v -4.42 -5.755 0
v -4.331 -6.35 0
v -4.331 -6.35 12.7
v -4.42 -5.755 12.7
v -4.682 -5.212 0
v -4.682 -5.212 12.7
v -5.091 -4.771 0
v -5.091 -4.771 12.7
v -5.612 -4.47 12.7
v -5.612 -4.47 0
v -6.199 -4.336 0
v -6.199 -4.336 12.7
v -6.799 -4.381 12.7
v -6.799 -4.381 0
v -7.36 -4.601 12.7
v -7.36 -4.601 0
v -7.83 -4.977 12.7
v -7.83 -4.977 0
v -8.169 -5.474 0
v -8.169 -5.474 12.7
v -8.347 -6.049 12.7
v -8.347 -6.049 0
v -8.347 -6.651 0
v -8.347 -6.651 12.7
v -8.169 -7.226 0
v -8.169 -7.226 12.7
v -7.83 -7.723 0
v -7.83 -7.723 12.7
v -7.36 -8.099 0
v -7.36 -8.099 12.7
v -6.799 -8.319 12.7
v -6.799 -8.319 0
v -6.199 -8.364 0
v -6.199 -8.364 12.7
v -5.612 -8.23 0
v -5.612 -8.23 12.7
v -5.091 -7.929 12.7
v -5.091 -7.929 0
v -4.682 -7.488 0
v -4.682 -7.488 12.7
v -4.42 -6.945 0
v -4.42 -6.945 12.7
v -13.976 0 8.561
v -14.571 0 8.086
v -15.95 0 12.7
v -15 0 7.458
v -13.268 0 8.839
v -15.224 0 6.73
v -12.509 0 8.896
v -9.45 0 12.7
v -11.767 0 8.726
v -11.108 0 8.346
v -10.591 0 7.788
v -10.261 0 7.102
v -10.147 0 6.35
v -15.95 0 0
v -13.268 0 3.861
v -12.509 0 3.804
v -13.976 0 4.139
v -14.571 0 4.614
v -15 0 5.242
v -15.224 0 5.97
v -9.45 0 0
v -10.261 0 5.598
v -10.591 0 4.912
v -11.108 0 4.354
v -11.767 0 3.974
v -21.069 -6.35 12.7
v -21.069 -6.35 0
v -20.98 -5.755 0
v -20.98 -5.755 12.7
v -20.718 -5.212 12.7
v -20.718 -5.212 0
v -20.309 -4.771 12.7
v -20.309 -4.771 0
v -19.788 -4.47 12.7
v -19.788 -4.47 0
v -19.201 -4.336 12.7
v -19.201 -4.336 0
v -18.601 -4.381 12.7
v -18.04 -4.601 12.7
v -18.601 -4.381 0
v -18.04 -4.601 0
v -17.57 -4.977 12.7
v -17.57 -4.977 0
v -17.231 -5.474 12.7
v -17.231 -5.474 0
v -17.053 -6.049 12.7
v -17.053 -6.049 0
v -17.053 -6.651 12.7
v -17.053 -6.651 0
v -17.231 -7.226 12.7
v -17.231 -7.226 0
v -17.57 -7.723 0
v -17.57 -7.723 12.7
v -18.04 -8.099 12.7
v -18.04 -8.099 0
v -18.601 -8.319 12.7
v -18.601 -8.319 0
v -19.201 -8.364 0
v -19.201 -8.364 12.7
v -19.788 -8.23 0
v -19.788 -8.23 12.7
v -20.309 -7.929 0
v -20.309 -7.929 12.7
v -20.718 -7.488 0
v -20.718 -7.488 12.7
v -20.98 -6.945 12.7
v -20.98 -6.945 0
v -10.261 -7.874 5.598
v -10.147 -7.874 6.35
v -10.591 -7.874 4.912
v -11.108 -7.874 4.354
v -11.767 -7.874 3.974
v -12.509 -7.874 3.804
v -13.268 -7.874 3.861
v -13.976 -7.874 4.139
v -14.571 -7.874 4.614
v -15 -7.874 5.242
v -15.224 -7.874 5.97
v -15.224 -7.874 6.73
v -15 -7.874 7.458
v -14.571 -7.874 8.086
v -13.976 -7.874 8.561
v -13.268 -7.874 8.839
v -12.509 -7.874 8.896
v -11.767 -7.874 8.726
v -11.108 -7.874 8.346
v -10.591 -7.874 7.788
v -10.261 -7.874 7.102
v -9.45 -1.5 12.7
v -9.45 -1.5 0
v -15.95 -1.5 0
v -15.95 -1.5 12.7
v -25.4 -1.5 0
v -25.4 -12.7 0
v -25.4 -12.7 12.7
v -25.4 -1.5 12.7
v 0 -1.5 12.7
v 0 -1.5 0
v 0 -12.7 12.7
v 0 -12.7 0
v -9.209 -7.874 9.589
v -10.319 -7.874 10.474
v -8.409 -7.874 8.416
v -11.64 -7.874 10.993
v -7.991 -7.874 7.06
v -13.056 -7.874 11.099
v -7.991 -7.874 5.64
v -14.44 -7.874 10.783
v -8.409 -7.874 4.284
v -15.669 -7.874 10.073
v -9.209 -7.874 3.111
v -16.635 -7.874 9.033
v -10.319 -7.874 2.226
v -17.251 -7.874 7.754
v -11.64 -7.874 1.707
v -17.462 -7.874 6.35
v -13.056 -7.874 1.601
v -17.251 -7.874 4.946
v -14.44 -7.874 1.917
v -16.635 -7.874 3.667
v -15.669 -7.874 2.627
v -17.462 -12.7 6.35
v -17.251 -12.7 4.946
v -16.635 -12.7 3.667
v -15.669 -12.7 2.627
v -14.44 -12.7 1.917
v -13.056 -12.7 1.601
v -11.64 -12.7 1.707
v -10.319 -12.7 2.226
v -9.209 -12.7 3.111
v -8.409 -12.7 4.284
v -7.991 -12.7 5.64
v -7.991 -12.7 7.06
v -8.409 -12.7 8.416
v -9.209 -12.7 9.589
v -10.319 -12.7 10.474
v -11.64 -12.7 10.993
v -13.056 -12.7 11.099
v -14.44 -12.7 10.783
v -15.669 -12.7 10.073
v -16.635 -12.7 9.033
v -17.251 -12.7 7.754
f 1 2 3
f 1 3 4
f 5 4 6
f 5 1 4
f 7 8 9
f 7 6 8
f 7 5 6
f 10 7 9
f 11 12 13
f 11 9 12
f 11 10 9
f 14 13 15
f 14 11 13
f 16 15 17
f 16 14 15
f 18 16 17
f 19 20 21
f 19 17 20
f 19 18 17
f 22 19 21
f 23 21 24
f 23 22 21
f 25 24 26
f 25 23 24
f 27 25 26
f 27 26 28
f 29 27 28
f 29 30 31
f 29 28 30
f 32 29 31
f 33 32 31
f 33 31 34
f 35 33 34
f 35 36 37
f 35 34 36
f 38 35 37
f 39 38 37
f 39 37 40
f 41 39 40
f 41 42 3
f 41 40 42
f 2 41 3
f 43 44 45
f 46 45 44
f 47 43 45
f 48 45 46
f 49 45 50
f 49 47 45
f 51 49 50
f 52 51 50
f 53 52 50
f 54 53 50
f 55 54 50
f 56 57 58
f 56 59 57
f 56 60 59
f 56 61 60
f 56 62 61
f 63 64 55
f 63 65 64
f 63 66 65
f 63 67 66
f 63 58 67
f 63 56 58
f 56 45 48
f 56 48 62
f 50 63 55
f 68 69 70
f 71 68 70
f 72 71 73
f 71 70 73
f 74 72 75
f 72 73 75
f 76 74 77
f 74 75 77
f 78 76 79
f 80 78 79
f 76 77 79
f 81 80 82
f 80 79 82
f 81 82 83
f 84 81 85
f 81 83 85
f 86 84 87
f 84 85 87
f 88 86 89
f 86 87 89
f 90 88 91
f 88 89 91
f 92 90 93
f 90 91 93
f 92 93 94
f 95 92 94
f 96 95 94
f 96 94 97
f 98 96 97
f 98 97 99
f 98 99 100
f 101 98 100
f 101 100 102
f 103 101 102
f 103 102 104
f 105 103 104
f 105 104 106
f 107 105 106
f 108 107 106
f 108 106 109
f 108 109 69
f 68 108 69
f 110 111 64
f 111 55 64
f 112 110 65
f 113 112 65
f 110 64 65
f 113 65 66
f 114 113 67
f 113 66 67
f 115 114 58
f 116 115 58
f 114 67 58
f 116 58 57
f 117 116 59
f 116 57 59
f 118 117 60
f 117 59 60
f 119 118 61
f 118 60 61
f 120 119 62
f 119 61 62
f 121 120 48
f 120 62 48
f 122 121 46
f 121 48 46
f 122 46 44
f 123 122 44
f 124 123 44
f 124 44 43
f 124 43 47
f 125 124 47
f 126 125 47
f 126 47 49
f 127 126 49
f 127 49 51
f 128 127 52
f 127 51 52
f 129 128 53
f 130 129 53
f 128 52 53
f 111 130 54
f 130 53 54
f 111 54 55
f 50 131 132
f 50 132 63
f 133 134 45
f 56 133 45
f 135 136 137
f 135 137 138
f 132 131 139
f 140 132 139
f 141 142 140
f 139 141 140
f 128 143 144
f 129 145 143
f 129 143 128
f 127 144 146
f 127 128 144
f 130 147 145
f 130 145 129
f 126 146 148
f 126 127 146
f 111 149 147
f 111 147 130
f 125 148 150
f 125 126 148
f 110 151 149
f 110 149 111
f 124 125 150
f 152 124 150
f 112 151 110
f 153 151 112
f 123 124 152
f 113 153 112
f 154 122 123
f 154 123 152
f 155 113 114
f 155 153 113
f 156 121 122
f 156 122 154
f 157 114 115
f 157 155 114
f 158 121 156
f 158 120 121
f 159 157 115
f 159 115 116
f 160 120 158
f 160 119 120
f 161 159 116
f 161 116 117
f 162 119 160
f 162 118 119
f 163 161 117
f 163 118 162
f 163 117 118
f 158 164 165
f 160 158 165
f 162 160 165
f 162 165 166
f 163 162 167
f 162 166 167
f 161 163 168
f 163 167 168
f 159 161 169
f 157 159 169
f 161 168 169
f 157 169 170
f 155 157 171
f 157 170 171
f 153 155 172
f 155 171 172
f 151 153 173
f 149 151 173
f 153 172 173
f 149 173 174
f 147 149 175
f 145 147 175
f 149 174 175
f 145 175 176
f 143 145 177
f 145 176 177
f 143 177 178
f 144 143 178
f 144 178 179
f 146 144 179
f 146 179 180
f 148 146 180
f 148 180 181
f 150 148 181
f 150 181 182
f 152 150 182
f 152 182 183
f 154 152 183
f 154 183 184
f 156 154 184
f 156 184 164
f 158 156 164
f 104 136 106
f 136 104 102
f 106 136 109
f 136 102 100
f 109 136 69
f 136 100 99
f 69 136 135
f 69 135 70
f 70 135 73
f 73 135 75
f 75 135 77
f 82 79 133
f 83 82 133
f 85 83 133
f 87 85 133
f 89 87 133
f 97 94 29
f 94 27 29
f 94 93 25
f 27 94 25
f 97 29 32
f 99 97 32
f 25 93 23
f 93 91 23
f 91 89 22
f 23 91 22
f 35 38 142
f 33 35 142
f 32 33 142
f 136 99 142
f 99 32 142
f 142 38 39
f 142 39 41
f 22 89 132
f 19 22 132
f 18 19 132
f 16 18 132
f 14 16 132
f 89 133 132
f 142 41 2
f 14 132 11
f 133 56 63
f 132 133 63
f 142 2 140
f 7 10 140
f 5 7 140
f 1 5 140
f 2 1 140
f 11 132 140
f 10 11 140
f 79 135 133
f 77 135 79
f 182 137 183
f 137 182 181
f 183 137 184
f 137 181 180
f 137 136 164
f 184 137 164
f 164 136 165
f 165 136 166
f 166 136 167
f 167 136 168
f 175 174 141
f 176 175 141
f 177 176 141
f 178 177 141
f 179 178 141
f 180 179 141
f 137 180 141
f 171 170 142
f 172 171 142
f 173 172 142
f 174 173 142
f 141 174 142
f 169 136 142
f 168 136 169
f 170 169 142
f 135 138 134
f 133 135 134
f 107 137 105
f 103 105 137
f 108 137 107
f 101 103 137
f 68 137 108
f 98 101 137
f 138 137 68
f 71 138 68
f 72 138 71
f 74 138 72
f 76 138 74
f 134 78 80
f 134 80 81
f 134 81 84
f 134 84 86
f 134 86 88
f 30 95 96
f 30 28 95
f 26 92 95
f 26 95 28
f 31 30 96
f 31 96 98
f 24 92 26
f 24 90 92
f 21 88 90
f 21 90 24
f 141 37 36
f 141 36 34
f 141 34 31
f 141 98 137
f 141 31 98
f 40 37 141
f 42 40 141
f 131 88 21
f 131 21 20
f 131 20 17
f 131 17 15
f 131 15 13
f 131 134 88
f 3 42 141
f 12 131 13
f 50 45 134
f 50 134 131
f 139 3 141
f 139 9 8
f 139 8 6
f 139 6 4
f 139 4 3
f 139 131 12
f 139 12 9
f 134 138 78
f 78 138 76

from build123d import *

# Parameters (mm, degrees)
SKETCH5_W                                       = 25.4
SKETCH5_H                                       = 12.7
BOSS_EXTRUDE2_DEPTH                             = 12.7
F_10_32_TAPPED_HOLE1_D                          = 4.0386
SKETCH6_W                                       = 9.45
SKETCH6_H                                       = 1.5
CUT_EXTRUDE1_DEPTH                              = 12.7
CBORE_FOR_10_SOCKET_HEAD_CAP_SCREW2_D           = 5.1054
CBORE_FOR_10_SOCKET_HEAD_CAP_SCREW2_CBORE_D     = 9.525
CBORE_FOR_10_SOCKET_HEAD_CAP_SCREW2_CBORE_DEPTH = 4.826


with BuildPart() as part:
    # Sketch5 → Boss-Extrude2 (new body)
    with BuildSketch(Plane.XY):
        with Locations((-12.7, -6.35)):
            Rectangle(SKETCH5_W, SKETCH5_H)
    extrude(amount=BOSS_EXTRUDE2_DEPTH)

    # #10-32 Tapped Hole1 (through all)
    with Locations(Plane.XY.offset(12.7)):
        with Locations((-19.05, -6.35)):
            f_10_32_tapped_hole1 = Hole(F_10_32_TAPPED_HOLE1_D / 2)

    # Mirror1: #10-32 Tapped Hole1 across plane
    add(f_10_32_tapped_hole1.mirror(Plane.ZY.offset(12.7)), mode=Mode.SUBTRACT)

    # Sketch6 → Cut-Extrude1 (cut)
    with BuildSketch(Plane.XY.offset(12.7)):
        with Locations((-20.675, -0.75)):
            Rectangle(SKETCH6_W, SKETCH6_H)
        with Locations((-4.725, -0.75)):
            Rectangle(SKETCH6_W, SKETCH6_H)
    extrude(amount=-CUT_EXTRUDE1_DEPTH, mode=Mode.SUBTRACT)

    # CBORE for #10 Socket Head Cap Screw2 (through all)
    with Locations(Plane(origin=(0, -12.7, 0), x_dir=(-1, 0, 0), z_dir=(0, -1, 0))):
        with Locations((12.7, -6.35)):
            CounterBoreHole(CBORE_FOR_10_SOCKET_HEAD_CAP_SCREW2_D / 2, CBORE_FOR_10_SOCKET_HEAD_CAP_SCREW2_CBORE_D / 2, CBORE_FOR_10_SOCKET_HEAD_CAP_SCREW2_CBORE_DEPTH)


solid = part.part
